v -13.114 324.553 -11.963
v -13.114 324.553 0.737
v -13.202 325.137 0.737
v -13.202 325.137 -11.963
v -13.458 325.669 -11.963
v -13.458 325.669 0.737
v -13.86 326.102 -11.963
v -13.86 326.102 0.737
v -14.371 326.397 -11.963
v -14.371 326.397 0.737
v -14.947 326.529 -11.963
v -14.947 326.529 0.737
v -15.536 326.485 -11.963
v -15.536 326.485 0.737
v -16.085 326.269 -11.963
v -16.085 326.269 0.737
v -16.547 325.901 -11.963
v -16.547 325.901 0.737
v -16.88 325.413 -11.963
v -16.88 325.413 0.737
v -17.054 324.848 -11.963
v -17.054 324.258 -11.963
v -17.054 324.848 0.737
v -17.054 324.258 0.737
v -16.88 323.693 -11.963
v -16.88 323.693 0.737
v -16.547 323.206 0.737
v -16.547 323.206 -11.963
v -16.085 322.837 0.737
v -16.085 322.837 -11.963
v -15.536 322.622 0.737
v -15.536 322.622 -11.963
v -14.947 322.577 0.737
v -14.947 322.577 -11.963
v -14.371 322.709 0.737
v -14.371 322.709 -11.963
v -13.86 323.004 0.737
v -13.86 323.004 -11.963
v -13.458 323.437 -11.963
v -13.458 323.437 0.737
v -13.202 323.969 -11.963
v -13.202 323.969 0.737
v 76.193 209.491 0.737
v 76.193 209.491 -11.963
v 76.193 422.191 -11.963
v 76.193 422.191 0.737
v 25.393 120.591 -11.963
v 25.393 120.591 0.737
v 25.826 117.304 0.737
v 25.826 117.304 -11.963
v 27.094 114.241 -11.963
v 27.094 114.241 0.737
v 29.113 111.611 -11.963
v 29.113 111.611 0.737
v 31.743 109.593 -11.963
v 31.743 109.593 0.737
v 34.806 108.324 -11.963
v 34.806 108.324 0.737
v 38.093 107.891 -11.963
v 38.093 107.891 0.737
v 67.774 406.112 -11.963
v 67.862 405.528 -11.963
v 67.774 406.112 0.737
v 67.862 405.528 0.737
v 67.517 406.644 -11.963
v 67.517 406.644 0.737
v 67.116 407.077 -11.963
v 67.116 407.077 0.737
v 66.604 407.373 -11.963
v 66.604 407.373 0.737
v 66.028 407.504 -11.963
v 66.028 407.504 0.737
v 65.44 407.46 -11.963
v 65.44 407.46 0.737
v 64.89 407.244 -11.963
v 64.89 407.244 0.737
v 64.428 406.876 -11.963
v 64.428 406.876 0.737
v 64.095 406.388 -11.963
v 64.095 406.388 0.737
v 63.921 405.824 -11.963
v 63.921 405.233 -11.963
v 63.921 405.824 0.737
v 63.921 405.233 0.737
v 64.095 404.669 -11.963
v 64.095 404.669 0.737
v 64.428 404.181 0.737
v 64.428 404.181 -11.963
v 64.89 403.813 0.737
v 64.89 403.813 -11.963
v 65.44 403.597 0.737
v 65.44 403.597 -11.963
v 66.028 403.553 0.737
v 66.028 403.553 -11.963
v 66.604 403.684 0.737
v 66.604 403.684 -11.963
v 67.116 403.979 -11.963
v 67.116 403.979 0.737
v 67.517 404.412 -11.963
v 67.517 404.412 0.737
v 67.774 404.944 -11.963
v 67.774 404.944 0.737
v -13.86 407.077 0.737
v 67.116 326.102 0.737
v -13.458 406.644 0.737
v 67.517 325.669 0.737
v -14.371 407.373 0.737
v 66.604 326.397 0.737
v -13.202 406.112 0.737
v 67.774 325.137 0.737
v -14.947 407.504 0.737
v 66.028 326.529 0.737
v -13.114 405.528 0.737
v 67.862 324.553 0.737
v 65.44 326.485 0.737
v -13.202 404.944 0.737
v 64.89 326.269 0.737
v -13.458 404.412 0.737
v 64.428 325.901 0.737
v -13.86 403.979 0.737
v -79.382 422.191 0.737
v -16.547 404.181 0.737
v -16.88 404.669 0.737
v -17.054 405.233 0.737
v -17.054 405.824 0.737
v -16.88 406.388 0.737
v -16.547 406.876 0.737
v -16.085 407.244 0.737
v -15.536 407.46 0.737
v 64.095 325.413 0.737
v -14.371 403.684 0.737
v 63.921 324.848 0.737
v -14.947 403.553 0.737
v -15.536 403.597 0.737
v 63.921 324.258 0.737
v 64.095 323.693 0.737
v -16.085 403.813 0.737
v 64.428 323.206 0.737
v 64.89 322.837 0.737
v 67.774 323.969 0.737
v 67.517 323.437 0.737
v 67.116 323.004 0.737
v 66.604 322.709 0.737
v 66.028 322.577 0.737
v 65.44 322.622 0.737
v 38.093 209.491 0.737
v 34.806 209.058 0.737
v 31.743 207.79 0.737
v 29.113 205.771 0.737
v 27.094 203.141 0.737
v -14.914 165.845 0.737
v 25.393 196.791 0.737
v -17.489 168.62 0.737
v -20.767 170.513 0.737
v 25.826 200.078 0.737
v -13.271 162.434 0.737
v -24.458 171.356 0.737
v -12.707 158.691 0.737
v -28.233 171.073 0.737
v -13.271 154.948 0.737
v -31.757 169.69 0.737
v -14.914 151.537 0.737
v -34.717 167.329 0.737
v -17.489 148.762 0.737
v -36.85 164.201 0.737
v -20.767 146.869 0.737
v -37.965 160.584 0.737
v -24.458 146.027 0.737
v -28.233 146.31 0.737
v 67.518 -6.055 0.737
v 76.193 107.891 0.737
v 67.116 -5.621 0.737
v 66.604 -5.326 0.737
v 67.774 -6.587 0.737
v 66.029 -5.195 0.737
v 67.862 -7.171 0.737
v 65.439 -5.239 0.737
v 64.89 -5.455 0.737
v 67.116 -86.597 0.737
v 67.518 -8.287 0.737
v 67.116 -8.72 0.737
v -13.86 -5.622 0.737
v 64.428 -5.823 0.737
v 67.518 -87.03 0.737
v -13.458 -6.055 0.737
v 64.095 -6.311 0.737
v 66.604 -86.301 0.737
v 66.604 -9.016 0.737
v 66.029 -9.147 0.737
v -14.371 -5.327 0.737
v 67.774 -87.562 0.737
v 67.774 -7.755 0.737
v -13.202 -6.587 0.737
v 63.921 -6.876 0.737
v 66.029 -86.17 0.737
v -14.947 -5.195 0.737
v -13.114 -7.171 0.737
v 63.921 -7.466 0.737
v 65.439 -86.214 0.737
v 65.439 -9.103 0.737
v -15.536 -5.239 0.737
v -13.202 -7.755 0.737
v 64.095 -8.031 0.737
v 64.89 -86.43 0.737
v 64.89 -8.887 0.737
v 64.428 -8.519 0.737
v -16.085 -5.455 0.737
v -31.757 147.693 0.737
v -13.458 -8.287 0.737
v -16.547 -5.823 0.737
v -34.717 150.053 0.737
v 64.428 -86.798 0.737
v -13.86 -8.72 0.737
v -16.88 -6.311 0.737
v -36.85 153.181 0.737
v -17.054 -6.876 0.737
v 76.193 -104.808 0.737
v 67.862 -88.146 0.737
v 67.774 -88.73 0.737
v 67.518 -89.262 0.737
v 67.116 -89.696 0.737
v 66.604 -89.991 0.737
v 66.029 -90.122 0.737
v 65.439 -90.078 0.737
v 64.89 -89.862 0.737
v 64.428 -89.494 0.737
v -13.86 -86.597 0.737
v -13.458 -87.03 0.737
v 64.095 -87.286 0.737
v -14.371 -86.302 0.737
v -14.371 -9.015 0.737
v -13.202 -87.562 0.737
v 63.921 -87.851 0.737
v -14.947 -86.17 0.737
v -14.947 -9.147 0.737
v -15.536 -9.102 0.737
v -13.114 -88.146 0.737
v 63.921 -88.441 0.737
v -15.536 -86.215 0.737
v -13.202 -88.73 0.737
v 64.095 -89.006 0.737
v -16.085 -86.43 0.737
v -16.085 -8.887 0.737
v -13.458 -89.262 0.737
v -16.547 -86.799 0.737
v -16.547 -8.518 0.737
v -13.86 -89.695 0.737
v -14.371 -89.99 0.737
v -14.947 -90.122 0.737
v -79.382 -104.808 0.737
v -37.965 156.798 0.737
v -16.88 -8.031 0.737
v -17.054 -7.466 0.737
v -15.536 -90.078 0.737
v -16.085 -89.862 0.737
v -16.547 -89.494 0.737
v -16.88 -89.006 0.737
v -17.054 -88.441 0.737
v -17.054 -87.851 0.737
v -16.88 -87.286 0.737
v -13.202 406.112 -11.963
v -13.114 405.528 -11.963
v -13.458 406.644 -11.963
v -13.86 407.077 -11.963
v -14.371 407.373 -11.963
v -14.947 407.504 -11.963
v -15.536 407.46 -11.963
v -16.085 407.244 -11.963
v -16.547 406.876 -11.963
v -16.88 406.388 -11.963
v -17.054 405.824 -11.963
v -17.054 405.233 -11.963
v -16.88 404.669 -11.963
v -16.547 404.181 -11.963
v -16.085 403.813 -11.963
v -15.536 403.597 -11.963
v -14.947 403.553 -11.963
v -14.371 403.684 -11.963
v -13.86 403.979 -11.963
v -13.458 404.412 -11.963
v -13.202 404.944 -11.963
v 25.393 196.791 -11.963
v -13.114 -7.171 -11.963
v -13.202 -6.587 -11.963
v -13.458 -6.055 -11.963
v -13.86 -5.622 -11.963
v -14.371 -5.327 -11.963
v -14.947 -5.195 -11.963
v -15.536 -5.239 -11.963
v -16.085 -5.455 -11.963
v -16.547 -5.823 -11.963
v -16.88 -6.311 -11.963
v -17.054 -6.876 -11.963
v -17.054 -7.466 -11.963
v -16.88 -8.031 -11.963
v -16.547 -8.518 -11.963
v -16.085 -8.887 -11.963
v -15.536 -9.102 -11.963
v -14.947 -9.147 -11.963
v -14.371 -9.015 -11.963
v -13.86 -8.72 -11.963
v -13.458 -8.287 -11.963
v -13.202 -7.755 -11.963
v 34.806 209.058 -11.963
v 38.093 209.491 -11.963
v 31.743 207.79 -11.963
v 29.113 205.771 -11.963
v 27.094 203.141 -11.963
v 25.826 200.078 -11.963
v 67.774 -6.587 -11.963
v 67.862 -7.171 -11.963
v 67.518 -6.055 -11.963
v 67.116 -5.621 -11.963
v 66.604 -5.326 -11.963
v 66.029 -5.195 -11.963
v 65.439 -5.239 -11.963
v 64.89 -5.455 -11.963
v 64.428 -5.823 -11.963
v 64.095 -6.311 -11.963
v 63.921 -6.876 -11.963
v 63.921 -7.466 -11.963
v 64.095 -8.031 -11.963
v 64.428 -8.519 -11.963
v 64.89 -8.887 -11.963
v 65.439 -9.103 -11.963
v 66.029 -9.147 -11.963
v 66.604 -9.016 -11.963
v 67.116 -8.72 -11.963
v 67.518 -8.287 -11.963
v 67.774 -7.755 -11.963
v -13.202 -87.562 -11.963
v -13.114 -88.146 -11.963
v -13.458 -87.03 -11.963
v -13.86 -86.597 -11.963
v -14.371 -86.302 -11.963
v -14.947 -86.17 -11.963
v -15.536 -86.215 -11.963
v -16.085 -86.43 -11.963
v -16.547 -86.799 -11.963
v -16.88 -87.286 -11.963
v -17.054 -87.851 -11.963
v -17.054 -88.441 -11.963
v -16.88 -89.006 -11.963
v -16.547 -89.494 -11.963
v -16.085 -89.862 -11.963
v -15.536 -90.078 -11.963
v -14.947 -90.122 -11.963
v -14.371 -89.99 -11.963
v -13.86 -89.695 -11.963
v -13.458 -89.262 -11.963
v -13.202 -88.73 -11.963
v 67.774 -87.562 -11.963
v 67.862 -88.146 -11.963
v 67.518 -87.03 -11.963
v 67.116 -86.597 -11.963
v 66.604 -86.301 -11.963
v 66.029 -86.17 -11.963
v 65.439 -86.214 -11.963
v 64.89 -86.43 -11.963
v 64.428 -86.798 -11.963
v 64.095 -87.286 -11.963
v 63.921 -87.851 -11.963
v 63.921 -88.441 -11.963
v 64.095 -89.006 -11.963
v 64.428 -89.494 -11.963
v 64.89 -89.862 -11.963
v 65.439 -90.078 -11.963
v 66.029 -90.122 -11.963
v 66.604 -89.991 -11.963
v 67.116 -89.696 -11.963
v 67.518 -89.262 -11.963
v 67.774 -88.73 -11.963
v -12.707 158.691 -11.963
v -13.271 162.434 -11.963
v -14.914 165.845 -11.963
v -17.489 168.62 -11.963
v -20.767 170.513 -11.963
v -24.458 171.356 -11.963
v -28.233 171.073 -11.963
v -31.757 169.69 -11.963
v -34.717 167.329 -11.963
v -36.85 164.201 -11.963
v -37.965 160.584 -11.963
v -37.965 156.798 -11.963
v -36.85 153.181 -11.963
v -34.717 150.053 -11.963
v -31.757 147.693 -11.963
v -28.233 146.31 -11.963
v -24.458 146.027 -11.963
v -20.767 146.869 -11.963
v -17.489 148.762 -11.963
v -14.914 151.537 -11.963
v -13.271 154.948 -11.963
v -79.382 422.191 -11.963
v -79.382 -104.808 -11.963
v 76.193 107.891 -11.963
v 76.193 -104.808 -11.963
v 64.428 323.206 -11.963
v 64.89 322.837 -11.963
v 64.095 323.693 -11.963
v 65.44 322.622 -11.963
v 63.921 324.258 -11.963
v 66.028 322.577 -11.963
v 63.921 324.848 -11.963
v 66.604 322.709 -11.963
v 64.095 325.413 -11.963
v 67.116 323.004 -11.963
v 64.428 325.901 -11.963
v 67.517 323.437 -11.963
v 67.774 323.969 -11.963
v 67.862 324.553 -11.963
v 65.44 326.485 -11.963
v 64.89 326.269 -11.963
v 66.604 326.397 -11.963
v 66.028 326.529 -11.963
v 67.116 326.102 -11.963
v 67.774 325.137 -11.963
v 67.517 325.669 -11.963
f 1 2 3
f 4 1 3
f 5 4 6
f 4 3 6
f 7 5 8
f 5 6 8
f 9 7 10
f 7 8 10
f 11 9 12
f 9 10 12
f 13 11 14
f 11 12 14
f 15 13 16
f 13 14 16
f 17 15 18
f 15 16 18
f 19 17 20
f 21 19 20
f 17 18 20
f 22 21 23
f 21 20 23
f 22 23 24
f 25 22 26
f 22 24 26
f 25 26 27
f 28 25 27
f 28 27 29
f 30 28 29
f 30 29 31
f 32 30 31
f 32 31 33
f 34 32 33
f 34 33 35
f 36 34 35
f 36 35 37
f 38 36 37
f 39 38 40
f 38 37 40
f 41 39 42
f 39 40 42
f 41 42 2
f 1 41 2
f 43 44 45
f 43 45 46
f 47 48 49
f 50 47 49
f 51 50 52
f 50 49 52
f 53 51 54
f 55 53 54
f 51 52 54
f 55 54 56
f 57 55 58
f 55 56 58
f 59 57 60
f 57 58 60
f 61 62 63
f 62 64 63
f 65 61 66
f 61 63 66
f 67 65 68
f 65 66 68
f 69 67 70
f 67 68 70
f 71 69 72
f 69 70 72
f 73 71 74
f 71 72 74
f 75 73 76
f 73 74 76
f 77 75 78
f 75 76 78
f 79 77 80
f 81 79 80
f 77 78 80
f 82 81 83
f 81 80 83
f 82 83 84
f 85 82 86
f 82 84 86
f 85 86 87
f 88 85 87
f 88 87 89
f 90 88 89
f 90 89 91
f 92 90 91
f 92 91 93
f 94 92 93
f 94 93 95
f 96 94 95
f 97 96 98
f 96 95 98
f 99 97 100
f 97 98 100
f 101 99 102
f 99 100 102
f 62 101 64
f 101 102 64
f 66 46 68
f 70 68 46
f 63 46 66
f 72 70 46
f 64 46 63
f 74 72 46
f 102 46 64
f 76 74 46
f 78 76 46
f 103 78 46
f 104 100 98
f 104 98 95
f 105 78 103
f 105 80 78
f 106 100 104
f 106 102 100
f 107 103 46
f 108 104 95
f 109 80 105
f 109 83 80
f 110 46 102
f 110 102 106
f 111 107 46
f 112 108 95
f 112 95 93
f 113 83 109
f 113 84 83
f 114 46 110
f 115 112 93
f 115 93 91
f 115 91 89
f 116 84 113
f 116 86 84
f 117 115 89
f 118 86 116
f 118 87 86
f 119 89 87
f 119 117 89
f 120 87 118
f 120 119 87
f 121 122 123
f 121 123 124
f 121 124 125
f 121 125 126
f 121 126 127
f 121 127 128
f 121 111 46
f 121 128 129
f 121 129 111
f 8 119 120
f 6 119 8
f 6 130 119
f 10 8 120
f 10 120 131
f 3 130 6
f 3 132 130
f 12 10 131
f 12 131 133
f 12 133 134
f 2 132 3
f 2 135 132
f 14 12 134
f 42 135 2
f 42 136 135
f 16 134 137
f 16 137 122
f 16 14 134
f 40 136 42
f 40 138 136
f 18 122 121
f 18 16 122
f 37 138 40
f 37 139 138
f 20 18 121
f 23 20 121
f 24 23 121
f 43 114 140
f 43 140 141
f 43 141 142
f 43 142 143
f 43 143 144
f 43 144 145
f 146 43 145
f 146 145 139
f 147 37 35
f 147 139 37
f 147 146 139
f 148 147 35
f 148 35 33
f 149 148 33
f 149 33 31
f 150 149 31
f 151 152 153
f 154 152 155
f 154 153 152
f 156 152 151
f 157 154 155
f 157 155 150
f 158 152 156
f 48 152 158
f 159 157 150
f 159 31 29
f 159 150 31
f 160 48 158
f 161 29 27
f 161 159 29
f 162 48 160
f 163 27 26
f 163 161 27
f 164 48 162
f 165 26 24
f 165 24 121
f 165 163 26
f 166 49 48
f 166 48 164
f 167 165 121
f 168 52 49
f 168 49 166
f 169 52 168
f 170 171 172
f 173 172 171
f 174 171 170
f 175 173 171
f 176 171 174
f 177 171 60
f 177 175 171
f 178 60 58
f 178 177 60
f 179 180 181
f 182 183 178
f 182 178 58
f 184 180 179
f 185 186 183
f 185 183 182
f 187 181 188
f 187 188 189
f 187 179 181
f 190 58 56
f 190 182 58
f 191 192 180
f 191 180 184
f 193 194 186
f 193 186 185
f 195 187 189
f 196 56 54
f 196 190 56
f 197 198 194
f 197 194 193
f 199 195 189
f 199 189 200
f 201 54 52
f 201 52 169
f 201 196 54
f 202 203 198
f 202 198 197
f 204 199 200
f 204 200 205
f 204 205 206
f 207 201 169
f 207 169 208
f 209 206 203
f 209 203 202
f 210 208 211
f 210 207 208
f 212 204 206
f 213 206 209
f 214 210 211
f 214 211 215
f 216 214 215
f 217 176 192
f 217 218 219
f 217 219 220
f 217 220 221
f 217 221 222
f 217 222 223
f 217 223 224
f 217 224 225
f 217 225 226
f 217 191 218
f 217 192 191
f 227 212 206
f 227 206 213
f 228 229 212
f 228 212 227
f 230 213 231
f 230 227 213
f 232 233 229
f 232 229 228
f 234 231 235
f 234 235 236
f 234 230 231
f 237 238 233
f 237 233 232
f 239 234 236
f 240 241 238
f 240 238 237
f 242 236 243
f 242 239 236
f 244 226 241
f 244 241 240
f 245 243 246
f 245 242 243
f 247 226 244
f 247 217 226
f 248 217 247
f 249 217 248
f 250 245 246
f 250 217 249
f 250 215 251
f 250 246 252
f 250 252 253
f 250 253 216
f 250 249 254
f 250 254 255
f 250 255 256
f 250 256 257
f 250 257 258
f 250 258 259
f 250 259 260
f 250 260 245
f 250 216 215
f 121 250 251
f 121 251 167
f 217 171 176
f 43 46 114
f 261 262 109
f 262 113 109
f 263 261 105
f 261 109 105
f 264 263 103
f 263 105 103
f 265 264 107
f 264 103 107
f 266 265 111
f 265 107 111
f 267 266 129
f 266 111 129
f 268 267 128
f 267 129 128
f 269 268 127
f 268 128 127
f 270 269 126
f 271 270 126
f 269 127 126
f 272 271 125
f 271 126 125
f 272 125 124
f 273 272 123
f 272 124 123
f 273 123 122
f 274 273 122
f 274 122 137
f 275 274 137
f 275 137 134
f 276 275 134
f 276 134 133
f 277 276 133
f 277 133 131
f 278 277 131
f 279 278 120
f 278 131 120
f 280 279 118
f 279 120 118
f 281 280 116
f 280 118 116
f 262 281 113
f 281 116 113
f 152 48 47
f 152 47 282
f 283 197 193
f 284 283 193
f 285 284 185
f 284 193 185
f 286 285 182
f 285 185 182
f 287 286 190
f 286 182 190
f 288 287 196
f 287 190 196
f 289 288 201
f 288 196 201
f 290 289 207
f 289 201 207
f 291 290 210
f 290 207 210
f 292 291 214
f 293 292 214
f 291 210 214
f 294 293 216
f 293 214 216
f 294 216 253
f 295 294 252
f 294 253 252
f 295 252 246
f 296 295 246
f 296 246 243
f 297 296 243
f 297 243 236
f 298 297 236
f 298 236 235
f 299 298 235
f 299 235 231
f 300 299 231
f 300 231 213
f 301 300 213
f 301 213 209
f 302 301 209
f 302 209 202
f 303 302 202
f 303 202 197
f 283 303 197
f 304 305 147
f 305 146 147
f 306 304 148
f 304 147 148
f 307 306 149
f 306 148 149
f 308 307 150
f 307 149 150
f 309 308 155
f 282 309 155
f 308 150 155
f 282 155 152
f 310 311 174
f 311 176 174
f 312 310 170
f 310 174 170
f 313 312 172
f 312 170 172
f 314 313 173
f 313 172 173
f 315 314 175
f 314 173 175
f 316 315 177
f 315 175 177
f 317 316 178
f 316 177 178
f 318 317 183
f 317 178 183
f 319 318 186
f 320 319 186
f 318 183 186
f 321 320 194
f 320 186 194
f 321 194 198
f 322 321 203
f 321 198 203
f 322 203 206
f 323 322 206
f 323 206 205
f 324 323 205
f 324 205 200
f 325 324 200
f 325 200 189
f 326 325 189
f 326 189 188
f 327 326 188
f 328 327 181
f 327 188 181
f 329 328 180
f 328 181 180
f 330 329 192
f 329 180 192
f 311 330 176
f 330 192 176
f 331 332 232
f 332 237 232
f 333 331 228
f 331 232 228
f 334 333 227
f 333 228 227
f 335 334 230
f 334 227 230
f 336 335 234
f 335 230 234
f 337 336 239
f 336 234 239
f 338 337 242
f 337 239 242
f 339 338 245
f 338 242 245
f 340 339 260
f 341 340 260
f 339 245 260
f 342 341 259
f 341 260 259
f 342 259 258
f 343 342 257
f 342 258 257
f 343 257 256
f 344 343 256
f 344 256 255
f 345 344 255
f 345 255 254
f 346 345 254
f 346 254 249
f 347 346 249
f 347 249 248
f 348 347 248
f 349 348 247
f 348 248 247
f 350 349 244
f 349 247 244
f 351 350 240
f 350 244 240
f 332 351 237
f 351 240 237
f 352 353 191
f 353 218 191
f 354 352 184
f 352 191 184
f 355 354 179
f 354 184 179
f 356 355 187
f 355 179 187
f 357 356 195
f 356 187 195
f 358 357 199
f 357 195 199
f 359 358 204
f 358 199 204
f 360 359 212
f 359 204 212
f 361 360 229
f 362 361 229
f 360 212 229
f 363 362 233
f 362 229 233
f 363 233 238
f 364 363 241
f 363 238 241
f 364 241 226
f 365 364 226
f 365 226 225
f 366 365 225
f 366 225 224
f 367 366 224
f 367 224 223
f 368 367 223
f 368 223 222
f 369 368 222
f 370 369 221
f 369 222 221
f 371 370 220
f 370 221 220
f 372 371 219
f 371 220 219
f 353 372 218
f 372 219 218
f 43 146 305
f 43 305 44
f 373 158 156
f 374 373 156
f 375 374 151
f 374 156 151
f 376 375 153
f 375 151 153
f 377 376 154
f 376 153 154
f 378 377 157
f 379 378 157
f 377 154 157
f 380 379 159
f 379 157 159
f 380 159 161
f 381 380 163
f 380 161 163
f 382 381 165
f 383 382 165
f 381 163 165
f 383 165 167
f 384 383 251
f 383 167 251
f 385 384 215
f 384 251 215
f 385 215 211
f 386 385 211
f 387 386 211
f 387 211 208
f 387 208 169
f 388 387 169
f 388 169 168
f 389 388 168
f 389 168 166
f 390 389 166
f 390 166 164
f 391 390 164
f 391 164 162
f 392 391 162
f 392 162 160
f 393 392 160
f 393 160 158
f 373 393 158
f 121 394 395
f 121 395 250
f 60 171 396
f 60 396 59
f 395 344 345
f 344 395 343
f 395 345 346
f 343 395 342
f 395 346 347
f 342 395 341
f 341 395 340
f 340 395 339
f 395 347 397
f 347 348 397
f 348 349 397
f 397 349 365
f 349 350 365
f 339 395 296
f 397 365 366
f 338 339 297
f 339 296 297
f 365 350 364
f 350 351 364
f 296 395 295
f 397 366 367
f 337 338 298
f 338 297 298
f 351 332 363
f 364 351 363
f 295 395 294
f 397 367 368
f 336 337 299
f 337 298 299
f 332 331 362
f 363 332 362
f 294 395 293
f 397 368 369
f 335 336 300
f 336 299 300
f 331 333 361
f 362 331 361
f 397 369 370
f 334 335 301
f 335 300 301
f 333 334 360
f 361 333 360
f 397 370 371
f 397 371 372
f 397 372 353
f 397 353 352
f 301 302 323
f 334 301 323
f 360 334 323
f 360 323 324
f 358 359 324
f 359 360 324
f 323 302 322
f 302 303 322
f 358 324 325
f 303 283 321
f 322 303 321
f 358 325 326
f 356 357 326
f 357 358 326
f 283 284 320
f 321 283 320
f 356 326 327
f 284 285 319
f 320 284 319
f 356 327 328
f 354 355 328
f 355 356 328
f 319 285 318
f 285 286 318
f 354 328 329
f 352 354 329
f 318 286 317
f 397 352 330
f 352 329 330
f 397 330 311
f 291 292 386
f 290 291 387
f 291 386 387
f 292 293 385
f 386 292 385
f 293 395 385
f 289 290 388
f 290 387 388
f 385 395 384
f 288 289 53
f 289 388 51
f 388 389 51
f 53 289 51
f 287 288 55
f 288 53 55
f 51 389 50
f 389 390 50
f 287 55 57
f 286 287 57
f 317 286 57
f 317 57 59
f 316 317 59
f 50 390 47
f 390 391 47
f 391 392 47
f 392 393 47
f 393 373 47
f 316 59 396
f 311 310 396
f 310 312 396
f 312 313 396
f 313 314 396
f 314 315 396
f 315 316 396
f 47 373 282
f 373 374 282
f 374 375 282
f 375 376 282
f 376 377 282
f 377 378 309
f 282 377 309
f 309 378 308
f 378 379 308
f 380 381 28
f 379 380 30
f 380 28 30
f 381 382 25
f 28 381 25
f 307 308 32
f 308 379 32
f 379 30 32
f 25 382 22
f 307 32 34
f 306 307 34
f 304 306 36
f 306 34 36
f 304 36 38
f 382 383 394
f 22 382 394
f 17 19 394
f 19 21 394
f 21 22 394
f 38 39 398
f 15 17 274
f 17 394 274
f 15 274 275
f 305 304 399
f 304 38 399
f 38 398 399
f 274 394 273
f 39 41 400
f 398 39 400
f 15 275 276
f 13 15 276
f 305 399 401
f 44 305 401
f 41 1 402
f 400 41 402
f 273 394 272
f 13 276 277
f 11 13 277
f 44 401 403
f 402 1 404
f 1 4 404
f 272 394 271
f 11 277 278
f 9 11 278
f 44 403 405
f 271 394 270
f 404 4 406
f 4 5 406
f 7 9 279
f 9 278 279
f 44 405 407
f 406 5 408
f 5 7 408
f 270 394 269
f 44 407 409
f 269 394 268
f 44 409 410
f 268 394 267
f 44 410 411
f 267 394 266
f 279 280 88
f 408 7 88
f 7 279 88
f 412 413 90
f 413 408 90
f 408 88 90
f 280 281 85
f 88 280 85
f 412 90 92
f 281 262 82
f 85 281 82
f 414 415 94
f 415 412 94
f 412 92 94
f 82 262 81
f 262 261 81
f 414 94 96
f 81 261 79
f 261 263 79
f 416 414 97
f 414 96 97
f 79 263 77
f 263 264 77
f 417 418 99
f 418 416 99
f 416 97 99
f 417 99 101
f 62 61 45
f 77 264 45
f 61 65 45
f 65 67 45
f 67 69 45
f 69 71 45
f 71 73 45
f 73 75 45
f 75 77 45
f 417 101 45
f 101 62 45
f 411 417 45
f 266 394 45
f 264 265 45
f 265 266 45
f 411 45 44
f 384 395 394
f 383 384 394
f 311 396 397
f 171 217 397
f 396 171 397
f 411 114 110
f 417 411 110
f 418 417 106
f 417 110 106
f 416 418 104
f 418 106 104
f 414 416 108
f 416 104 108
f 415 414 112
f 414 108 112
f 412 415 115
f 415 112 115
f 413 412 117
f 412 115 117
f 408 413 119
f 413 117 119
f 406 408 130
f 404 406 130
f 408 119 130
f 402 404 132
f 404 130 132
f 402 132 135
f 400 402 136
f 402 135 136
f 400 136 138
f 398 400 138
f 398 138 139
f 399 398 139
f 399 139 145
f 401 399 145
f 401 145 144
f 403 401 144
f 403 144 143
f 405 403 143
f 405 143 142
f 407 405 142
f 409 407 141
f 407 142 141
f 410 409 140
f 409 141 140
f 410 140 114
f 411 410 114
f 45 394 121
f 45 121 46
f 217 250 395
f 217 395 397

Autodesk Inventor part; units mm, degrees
ref_plane "YZ Plane" through (0, 0, 0) normal (1, 0, 0) x (0, 1, 0)
ref_plane "XZ Plane" through (0, 0, 0) normal (0, 1, 0) x (-1, 0, 0)
ref_plane "XY Plane" through (0, 0, 0) normal (0, 0, 1) x (1, 0, 0)
sketch "Sketch1" plane through (0, 0, 0) normal (0, 0, 1) x (1, 0, 0)
  line L0 (-25.4072, 25.3665) -> (76.1928, 25.3665)
  line L1 (76.1928, 25.3665) -> (76.1928, -76.2335)
  line L2 (76.1928, -76.2335) -> (-25.4072, -76.2335)
  line L3 (-25.4072, -76.2335) -> (-25.4072, 25.3665)
  point P0 (0, 0)
  dimension "d0" = 101.6
  dimension "d1" = 101.6
extrude "Extrusion1" add sketch "Sketch1" along normal blind 0.7366
sketch "Sketch2" plane through (0, 0, 0.7366) normal (0, 0, 1) x (1, 0, 0)
  line L0 (-25.4072, 25.3665) -> (76.1928, -76.2335)
  line L1 (76.1928, 25.3665) -> (-25.4072, -76.2335)
  circle A0 centre (25.3928, -25.4335) radius 27.432
  point P0 (0, 0)
  dimension "d4" = 54.864
extrude "Extrusion2" cut sketch "Sketch2" against normal blind 0.7366
sketch "Sketch3" plane through (0, 0, 0.7366) normal (0, 0, 1) x (1, 0, 0)
  line L0 (-25.4072, -76.2335) -> (-25.4072, 25.3665) projected
  line L1 (-25.4072, 25.3665) -> (-25.4072, -25.4335)
  line L2 (-25.4072, -25.4335) -> (-25.4072, 19.4102)
  line L3 (-25.4072, 25.3665) -> (76.1928, -76.2335)
  line L4 (76.1928, 25.3665) -> (-25.4072, -76.2335)
  circle A0 centre (-19.4509, 19.4102) radius 1.9812
  point P0 (0, 0)
  dimension "d7" = 44.8437
  dimension "d8" = 3.9624
extrude "Extrusion3" cut sketch "Sketch3" against normal blind 0.7366 contours A0 L3 | L3 A0
sketch "Sketch4" plane through (0, 0, 0.7366) normal (0, 0, 1) x (1, 0, 0)
  line L0 (-25.4072, -76.2335) -> (76.1928, 25.3665)
  line L1 (-25.4072, 25.3665) -> (76.1928, -76.2335)
  circle A0 centre (70.2365, 19.4102) radius 1.9819
  circle A1 centre (70.2365, -70.2772) radius 1.983
  circle A2 centre (-19.4509, -70.2772) radius 1.9812
  point P0 (0, 0)
extrude "Extrusion4" cut sketch "Sketch4" against normal blind 0.7366
sketch "Sketch5" plane through (0, 0, 0.7366) normal (0, 0, 1) x (1, 0, 0)
  circle A0 centre (25.3928, -25.4335) radius 27.432 projected
  circle A1 centre (25.3928, -25.4335) radius 29.972
  circle A2 centre (25.3928, -25.4335) radius 32.512
  point P0 (0, 0)
  dimension "d13" = 59.944
  dimension "d14" = 65.024
extrude "Extrusion5" add sketch "Sketch5" along normal blind 6.6548 contours A2
fillet "Fillet1" radius 3.175 4 edges at (-25.4072, 25.3665, 0.3683) (76.1928, 25.3665, 0.3683) (76.1928, -76.2335, 0.3683) (-25.4072, -76.2335, 0.3683)
sketch "Sketch6" plane through (25.3928, -25.4335, 0.7366) normal (0, 0, 1) x (1, 0, 0)
  circle A0 centre (0, 0) radius 29.972 projected
  circle A1 centre (0, 0) radius 27.432 projected
  point P0 (-25.3928, 25.4335)
extrude "Extrusion6" add sketch "Sketch6" along normal blind 9.1948
sketch "Sketch7" plane through (25.3928, -25.4335, 7.3914) normal (0, 0, 1) x (1, 0, 0)
  circle A0 centre (0, 0) radius 29.972 projected
  circle A1 centre (0, 0) radius 32.512 projected
  point P0 (-25.3928, 25.4335)
extrude "Extrusion7" cut sketch "Sketch7" against normal blind 6.6548
sketch "Sketch8" plane through (25.3928, -25.4335, 9.9314) normal (0, 0, 1) x (1, 0, 0)
  circle A0 centre (0, 0) radius 27.432 projected
  circle A1 centre (0, 0) radius 29.972 projected
  point P0 (-25.3928, 25.4335)
extrude "Extrusion8" cut sketch "Sketch8" against normal blind 2.54
sketch "Sketch9" plane through (0, 0, 0.7366) normal (0, 0, 1) x (1, 0, 0)
  circle A0 centre (-19.4509, 19.4102) radius 1.9812 projected
  circle A1 centre (70.2365, -70.2772) radius 1.983 projected
  circle A2 centre (-19.4509, -70.2772) radius 1.9812 projected
  circle A3 centre (70.2365, 19.4102) radius 1.9819 projected
  point P0 (0, 0)
extrude "Extrusion9" add sketch "Sketch9" against normal blind 0.7366
sketch "Sketch10" plane through (0, 0, 0.7366) normal (0, 0, 1) x (1, 0, 0)
  line L0 (-25.4072, 25.3665) -> (76.1928, 25.3665)
  line L1 (76.1928, 25.3665) -> (76.1928, -76.2335)
  line L2 (76.1928, -76.2335) -> (-25.4072, -76.2335)
  line L3 (-25.4072, -76.2335) -> (-25.4072, 25.3665)
  line L4 (-25.4072, 25.3665) -> (76.1928, -76.2335)
  line L5 (-25.4072, -76.2335) -> (76.1928, 25.3665)
  line L6 (-25.4072, 25.3665) -> (-25.4072, -25.4335)
  line L7 (-25.4072, -25.4335) -> (-25.4072, 15.0541)
  circle A0 centre (-15.0948, 15.0541) radius 1.9812
  circle A1 centre (65.8804, 15.0541) radius 1.9818
  circle A2 centre (65.8804, -65.9211) radius 1.9832
  circle A3 centre (-15.0948, -65.9211) radius 1.9812
  point P0 (0, 0)
  dimension "d26" = 40.4876
  dimension "d27" = 3.9624
extrude "Extrusion10" cut sketch "Sketch10" against normal blind 0.7366 contours A0 L4 | L4 A0 | A1 L5 | L5 A1 | A2 L4 | L4 A2 | A3 L5 | L5 A3
sketch "Sketch11" plane through (0, 0, 0.7366) normal (0, 0, 1) x (1, 0, 0)
  circle A0 centre (-15.0948, 15.0541) radius 1.9812 projected
  circle A1 centre (-15.0948, -65.9211) radius 1.9812 projected
  circle A2 centre (65.8804, 15.0541) radius 1.9818 projected
  circle A3 centre (65.8804, -65.9211) radius 1.9832 projected
  line L0 (-25.4072, 25.3665) -> (76.1928, 25.3665)
  line L1 (76.1928, 25.3665) -> (76.1928, -76.2335)
  line L2 (76.1928, -76.2335) -> (-25.4072, -76.2335)
  line L3 (-25.4072, -76.2335) -> (-25.4072, 25.3665)
  point P0 (0, 0)
extrude "Extrusion11" add sketch "Sketch11" along normal blind 12.7
sketch "Sketch12" plane through (0, 0, 13.4366) normal (0, 0, 1) x (1, 0, 0)
  circle A0 centre (65.8804, -65.9211) radius 1.9832 projected
  circle A1 centre (65.8804, 15.0541) radius 1.9818 projected
  circle A2 centre (-15.0948, 15.0541) radius 1.9812 projected
  circle A3 centre (-15.0948, -65.9211) radius 1.9812 projected
  line L0 (76.1928, 25.3665) -> (76.1928, -76.2335) projected
  line L1 (-25.4072, 25.3665) -> (76.1928, 25.3665) projected
  line L2 (-25.4072, -76.2335) -> (-25.4072, 25.3665) projected
  line L3 (76.1928, -76.2335) -> (-25.4072, -76.2335) projected
  point P0 (0, 0)
extrude "Extrusion12" add sketch "Sketch12" against normal blind 19.05
sketch "Sketch13" plane through (0, 0, 13.4366) normal (0, 0, 1) x (1, 0, 0)
  circle A0 centre (65.8804, -65.9211) radius 1.9832 projected
  circle A1 centre (65.8804, 15.0541) radius 1.9818 projected
  circle A2 centre (-15.0948, 15.0541) radius 1.9812 projected
  circle A3 centre (-15.0948, -65.9211) radius 1.9812 projected
  line L0 (76.1928, 25.3665) -> (76.1928, -76.2335) projected
  line L1 (-25.4072, 25.3665) -> (76.1928, 25.3665) projected
  line L2 (-25.4072, -76.2335) -> (-25.4072, 25.3665) projected
  line L3 (76.1928, -76.2335) -> (-25.4072, -76.2335) projected
  point P0 (0, 0)
extrude "Extrusion13" cut sketch "Sketch13" against normal blind 12.7
sketch "Sketch14" plane through (-25.4072, 25.3665, -5.6134) normal (0, 1, 0) x (1, 0, 0)
  line L0 (0, -6.35) -> (101.6, -6.35) projected
  line L1 (101.6, -6.35) -> (101.6, 0) projected
  line L2 (101.6, 0) -> (0, 0) projected
  line L3 (0, 0) -> (0, -6.35) projected
  point P0 (25.4072, -5.6134)
sketch "Sketch15" plane through (-25.4072, -76.2335, -5.6134) normal (-1, 0, 0) x (0, 0, 1)
  line L0 (6.35, 0) -> (6.35, 101.6) projected
  line L1 (0, 101.6) -> (6.35, 101.6) projected
  line L2 (0, 101.6) -> (0, 0) projected
  line L3 (6.35, 0) -> (0, 0) projected
  point P0 (5.6134, 76.2335)
sketch "Sketch16" plane through (-25.4072, -76.2335, -5.6134) normal (0, -1, 0) x (1, 0, 0)
  line L0 (101.6, 6.35) -> (0, 6.35) projected
  line L1 (0, 6.35) -> (0, 0) projected
  line L2 (0, 0) -> (101.6, 0) projected
  line L3 (101.6, 6.35) -> (101.6, 0) projected
  point P0 (25.4072, 5.6134)
sketch "Sketch17" plane through (76.1928, -76.2335, -5.6134) normal (1, 0, 0) x (0, 0, -1)
  line L0 (-6.35, 101.6) -> (-6.35, 0) projected
  line L1 (-6.35, 0) -> (0, 0) projected
  line L2 (0, 0) -> (0, 101.6) projected
  line L3 (-6.35, 101.6) -> (0, 101.6) projected
  point P0 (-5.6134, 76.2335)
extrude "Extrusion14" add sketch "Sketch14" along normal blind 53.975
extrude "Extrusion15" add sketch "Sketch17" along normal blind 47.625
extrude "Extrusion16" add sketch "Sketch16" along normal blind 47.625
extrude "Extrusion17" add sketch "Sketch15" along normal blind 53.975
sketch "Sketch18" plane through (-25.4072, 25.3665, 0.7366) normal (0, 1, 0) x (1, 0, 0)
  line L0 (-53.975, 6.35) -> (-53.975, 0) projected
  line L1 (0, 0) -> (-53.975, 0) projected
  line L2 (0, 6.35) -> (0, 0) projected
  line L3 (0, 6.35) -> (-53.975, 6.35) projected
  point P0 (25.4072, 0.7366)
extrude "Extrusion18" add sketch "Sketch18" along normal blind 53.975
sketch "Sketch19" plane through (76.1928, 25.3665, 0.7366) normal (0, 1, 0) x (1, 0, 0)
  line L0 (47.625, 0) -> (47.625, 6.35) projected
  line L1 (0, 6.35) -> (47.625, 6.35) projected
  line L2 (0, 0) -> (0, 6.35) projected
  line L3 (0, 0) -> (47.625, 0) projected
  point P0 (-76.1928, 0.7366)
extrude "Extrusion19" add sketch "Sketch19" along normal blind 53.975
sketch "Sketch20" plane through (-25.4072, -123.8585, -5.6134) normal (-1, 0, 0) x (0, 0, 1)
  line L0 (6.35, 47.625) -> (0, 47.625) projected
  line L1 (0, 47.625) -> (0, 0) projected
  line L2 (0, 0) -> (6.35, 0) projected
  line L3 (6.35, 0) -> (6.35, 47.625) projected
  point P0 (5.6134, 123.8585)
extrude "Extrusion20" add sketch "Sketch20" along normal blind 53.975
sketch "Sketch21" plane through (123.8178, -76.2335, -5.6134) normal (0, -1, 0) x (1, 0, 0)
  line L0 (-47.625, 6.35) -> (-47.625, 0) projected
  line L1 (-47.625, 0) -> (0, 0) projected
  line L2 (0, 0) -> (0, 6.35) projected
  line L3 (0, 6.35) -> (-47.625, 6.35) projected
  point P0 (-123.8178, 5.6134)
extrude "Extrusion21" add sketch "Sketch21" along normal blind 47.625
sketch "Sketch22" plane through (-25.4072, 79.3415, -5.6134) normal (0, 1, 0) x (1, 0, 0)
  line L0 (149.225, -6.35) -> (-53.975, -6.35) projected
  line L1 (149.225, 0) -> (149.225, -6.35) projected
  line L2 (-53.975, 0) -> (149.225, 0) projected
  line L3 (-53.975, -6.35) -> (-53.975, 0) projected
  point P0 (25.4072, -5.6134)
extrude "Extrusion22" cut sketch "Sketch22" against normal blind 53.975
sketch "Sketch23" plane through (-79.3822, -76.2335, -5.6134) normal (-1, 0, 0) x (0, 0, 1)
  line L0 (6.35, 101.6) -> (0, 101.6) projected
  line L1 (0, -47.625) -> (0, 101.6) projected
  line L2 (6.35, -47.625) -> (0, -47.625) projected
  line L3 (6.35, 101.6) -> (6.35, -47.625) projected
  point P0 (5.6134, 76.2335)
extrude "Extrusion23" cut sketch "Sketch23" against normal blind 53.975
sketch "Sketch24" plane through (-25.4072, -123.8585, -5.6134) normal (0, -1, 0) x (1, 0, 0)
  line L0 (0, 6.35) -> (0, 0) projected
  line L1 (149.225, 0) -> (0, 0) projected
  line L2 (149.225, 6.35) -> (149.225, 0) projected
  line L3 (0, 6.35) -> (149.225, 6.35) projected
  point P0 (25.4072, 5.6134)
extrude "Extrusion24" cut sketch "Sketch24" against normal blind 47.625
sketch "Sketch25" plane through (123.8178, -76.2335, -5.6134) normal (1, 0, 0) x (0, 0, -1)
  line L0 (-6.35, 0) -> (0, 0) projected
  line L1 (0, 101.6) -> (0, 0) projected
  line L2 (0, 101.6) -> (-6.35, 101.6) projected
  line L3 (-6.35, 0) -> (-6.35, 101.6) projected
  point P0 (-5.6134, 76.2335)
extrude "Extrusion25" cut sketch "Sketch25" against normal blind 47.625
sketch "Sketch26" plane through (-25.4072, 25.3665, -5.6134) normal (0, 1, 0) x (1, 0, 0)
  line L0 (101.6, -6.35) -> (101.6, 0) projected
  line L1 (0, 0) -> (101.6, 0) projected
  line L2 (0, 0) -> (0, -6.35) projected
  line L3 (101.6, -6.35) -> (0, -6.35) projected
  point P0 (25.4072, -5.6134)
extrude "Extrusion26" add sketch "Sketch26" along normal blind 53.975
sketch "Sketch27" plane through (-25.4072, -76.2335, -5.6134) normal (-1, 0, 0) x (0, 0, 1)
  line L0 (0, 0) -> (6.35, 0) projected
  line L1 (6.35, 0) -> (6.35, 155.575) projected
  line L2 (6.35, 155.575) -> (0, 155.575) projected
  line L3 (0, 0) -> (0, 155.575) projected
  point P0 (5.6134, 76.2335)
extrude "Extrusion27" add sketch "Sketch27" along normal blind 53.975
sketch "Sketch28" plane through (-25.4072, -76.2335, -5.6134) normal (0, -1, 0) x (1, 0, 0)
  line L0 (101.6, 0) -> (101.6, 6.35) projected
  line L1 (101.6, 6.35) -> (-53.975, 6.35) projected
  line L2 (-53.975, 6.35) -> (-53.975, 0) projected
  line L3 (101.6, 0) -> (-53.975, 0) projected
  point P0 (25.4072, 5.6134)
extrude "Extrusion28" add sketch "Sketch28" along normal blind 22.225
sketch "Sketch29" plane through (-25.4072, 79.3415, -5.6134) normal (0, 1, 0) x (1, 0, 0)
  line L0 (101.6, -6.35) -> (-53.975, -6.35) projected
  line L1 (101.6, 0) -> (101.6, -6.35) projected
  line L2 (-53.975, 0) -> (101.6, 0) projected
  line L3 (-53.975, 0) -> (-53.975, -6.35) projected
  point P0 (25.4072, -5.6134)
extrude "Extrusion29" add sketch "Sketch29" along normal blind 158.6992
sketch "Sketch30" plane through (-25.4072, 238.0407, -5.6134) normal (0, 1, 0) x (1, 0, 0)
  line L0 (-53.975, -6.35) -> (-53.975, 0) projected
  line L1 (101.6, -6.35) -> (-53.975, -6.35) projected
  line L2 (101.6, 0) -> (101.6, -6.35) projected
  line L3 (-53.975, 0) -> (101.6, 0) projected
  point P0 (25.4072, -5.6134)
extrude "Extrusion30" add sketch "Sketch30" along normal blind 177.8
sketch "Sketch31" plane through (0, 0, 0.7366) normal (0, 0, 1) x (1, 0, 0)
  line L0 (76.1928, 415.8407) -> (76.1928, -98.4585) projected
  line L1 (76.1928, 415.8407) -> (-79.3822, 415.8407) projected
  line L2 (65.8804, 415.8407) -> (65.8804, 383.3033)
  line L3 (65.8804, 383.3033) -> (-17.076, 383.3033)
  line L4 (-17.076, 383.3033) -> (-13.1136, 383.3033)
  line L5 (-13.1136, 383.3033) -> (-15.0948, 383.3033)
  circle A0 centre (-15.0948, 383.3033) radius 1.9812
  circle A1 centre (65.8804, 383.3033) radius 1.9812
  line L6 (65.8804, 383.3033) -> (65.8804, 302.3281)
  circle A2 centre (65.8804, 302.3281) radius 1.9812
  line L7 (-15.0948, 383.3033) -> (-15.0948, 302.3281)
  circle A3 centre (-15.0948, 302.3281) radius 1.9812
  point P0 (0, 0)
  dimension "d70" = 32.5374
  dimension "d71" = 80.9752
extrude "Extrusion31" cut sketch "Sketch31" against normal blind 177.8
sketch "Sketch32" plane through (0, 0, -5.6134) normal (0, 0, -1) x (-1, 0, 0)
  circle A0 centre (15.0948, 383.3033) radius 1.9812 projected
  circle A1 centre (15.0948, 302.3281) radius 1.9812 projected
  circle A2 centre (-65.8804, 302.3281) radius 1.9812 projected
  circle A3 centre (-65.8804, 383.3033) radius 1.9812 projected
  circle A4 centre (15.0948, -65.9211) radius 1.9812 projected
  circle A5 centre (15.0948, 15.0541) radius 1.9812 projected
  circle A6 centre (-65.8804, 15.0541) radius 1.9818 projected
  circle A7 centre (-65.8804, -65.9211) radius 1.9832 projected
  line L0 (-76.1928, 415.8407) -> (-76.1928, -98.4585) projected
  line L1 (-76.1928, -98.4585) -> (79.3822, -98.4585) projected
  line L2 (79.3822, -98.4585) -> (79.3822, 415.8407) projected
  line L3 (79.3822, 415.8407) -> (-76.1928, 415.8407) projected
  point P0 (0, 0)
extrude "Extrusion32" add sketch "Sketch32" along normal blind 6.35
sketch "Sketch33" plane through (0, 0, 0.7366) normal (0, 0, 1) x (1, 0, 0)
  line L0 (76.1928, 415.8407) -> (76.1928, -98.4585) projected
  line L1 (76.1928, 158.6911) -> (76.1928, 107.8911)
  line L2 (76.1928, 107.8911) -> (25.3928, 107.8911)
  line L3 (25.3928, 107.8911) -> (25.3928, 209.4911)
  line L4 (25.3928, 209.4911) -> (76.1928, 209.4911)
  line L5 (76.1928, 209.4911) -> (76.1928, 107.8911)
  point P0 (0, 0)
  dimension "d76" = 50.8
  dimension "d77" = 50.8
  dimension "d78" = 101.6
extrude "Extrusion33" cut sketch "Sketch33" against normal blind 25.4
sketch "Sketch34" plane through (0, 0, 0.7366) normal (0, 0, 1) x (1, 0, 0)
  line L0 (25.3928, 107.8911) -> (25.3928, 209.4911) projected
  line L1 (76.1928, 107.8911) -> (76.1928, -98.4585) projected
  line L2 (25.3928, 158.6911) -> (-25.4072, 158.6911)
  circle A0 centre (-25.4072, 158.6911) radius 12.7
  point P0 (0, 0)
  dimension "d81" = 50.8
  dimension "d82" = 25.4
extrude "Extrusion34" cut sketch "Sketch34" against normal blind 25.4
fillet "Fillet2" radius 12.7 2 edges at (25.3928, 209.4911, -5.6134) (25.3928, 107.8911, -5.6134)
sketch "Sketch35" plane through (0, 0, 0.7366) normal (0, 0, 1) x (1, 0, 0)
  line L0 (-79.3822, 415.8407) -> (76.1928, 415.8407)
  line L1 (76.1928, 415.8407) -> (76.1928, 422.1907)
  line L2 (76.1928, 422.1907) -> (-79.3822, 422.1907)
  line L3 (-79.3822, 422.1907) -> (-79.3822, 415.8407)
  line L4 (-79.3822, -98.4585) -> (76.1928, -98.4585)
  line L5 (76.1928, -98.4585) -> (76.1928, -104.8085)
  line L6 (76.1928, -104.8085) -> (-79.3822, -104.8085)
  line L7 (-79.3822, -104.8085) -> (-79.3822, -98.4585)
  point P0 (0, 0)
  dimension "d86" = 6.35
  dimension "d87" = 6.35
extrude "Extrusion35" add sketch "Sketch35" against normal blind 6.35
sketch "Sketch36" plane through (-25.4072, 415.8407, -5.6134) normal (0, 1, 0) x (1, 0, 0)
  line L0 (-53.975, 0) -> (101.6, 0) projected
  line L1 (101.6, 6.35) -> (101.6, 0) projected
  line L2 (101.6, 6.35) -> (-53.975, 6.35) projected
  line L3 (-53.975, 0) -> (-53.975, 6.35) projected
  point P0 (25.4072, -5.6134)
extrude "Extrusion36" add sketch "Sketch36" along normal blind 6.35
sketch "Sketch37" plane through (-25.4072, -98.4585, -5.6134) normal (0, -1, 0) x (1, 0, 0)
  line L0 (101.6, 0) -> (-53.975, 0) projected
  line L1 (-53.975, -6.35) -> (-53.975, 0) projected
  line L2 (-53.975, -6.35) -> (101.6, -6.35) projected
  line L3 (101.6, 0) -> (101.6, -6.35) projected
  point P0 (25.4072, 5.6134)
extrude "Extrusion37" add sketch "Sketch37" along normal blind 6.35
sketch "Sketch38" plane through (0, 0, 0.7366) normal (0, 0, 1) x (1, 0, 0)
  line L0 (76.1928, 422.1907) -> (-79.3822, 422.1907) projected
  line L1 (76.1928, 107.8911) -> (76.1928, -104.8085) projected
  circle A0 centre (65.8804, 302.3281) radius 1.9812 projected
  circle A1 centre (-15.0948, 302.3281) radius 1.9812 projected
  line L2 (-15.0948, 422.1907) -> (-15.0948, 405.5283)
  line L3 (-15.0948, 405.5283) -> (65.8804, 405.5283)
  line L4 (65.8804, 302.3281) -> (65.8804, 324.5531)
  line L5 (-15.0948, 302.3281) -> (-15.0948, 324.5531)
  circle A2 centre (-15.0948, 324.5531) radius 1.9812
  circle A3 centre (-15.0948, 405.5283) radius 1.9812
  circle A4 centre (65.8804, 405.5283) radius 1.9812
  circle A5 centre (65.8804, 324.5531) radius 1.9812
  point P0 (0, 0)
  dimension "d94" = 16.6624
  dimension "d95" = 22.225
extrude "Extrusion38" cut sketch "Sketch38" against normal blind 12.7 contours A3 L3 L2 | L2 L3 A3 | A2 | A4 | A5
sketch "Sketch39" plane through (0, 0, 0.7366) normal (0, 0, 1) x (1, 0, 0)
  circle A0 centre (65.8804, 383.3033) radius 1.9812 projected
  circle A1 centre (65.8804, 302.3281) radius 1.9812 projected
  circle A2 centre (-15.0948, 302.3281) radius 1.9812 projected
  circle A3 centre (-15.0948, 383.3033) radius 1.9812 projected
  point P0 (0, 0)
extrude "Extrusion39" add sketch "Sketch39" against normal blind 12.7
sketch "Sketch40" plane through (0, 0, 0.7366) normal (0, 0, 1) x (1, 0, 0)
  circle A0 centre (-15.0948, 15.0541) radius 1.9812 projected
  circle A1 centre (-15.0948, -65.9211) radius 1.9812 projected
  line L0 (76.1928, 107.8911) -> (76.1928, -104.8085) projected
  line L1 (-15.0948, -65.9211) -> (-15.0948, -88.1461)
  line L2 (-15.0948, -88.1461) -> (65.8804, -88.1461)
  line L3 (-15.0948, 15.0541) -> (-15.0948, -7.1709)
  line L4 (-15.0948, -7.1709) -> (65.8804, -7.1709)
  circle A2 centre (-15.0948, -88.1461) radius 1.9812
  circle A3 centre (65.8804, -88.1461) radius 1.9818
  circle A4 centre (65.8804, -7.1709) radius 1.9818
  circle A5 centre (-15.0948, -7.1709) radius 1.9812
  point P0 (0, 0)
  dimension "d100" = 22.225
  dimension "d101" = 22.225
extrude "Extrusion40" cut sketch "Sketch40" against normal blind 12.7 contours A2 L2 L1 | L1 L2 A2 | A5 L4 L3 | L3 L4 A5 | A3 | A4
sketch "Sketch41" plane through (0, 0, 0.7366) normal (0, 0, 1) x (1, 0, 0)
  circle A0 centre (65.8804, -65.9211) radius 1.9832 projected
  circle A1 centre (65.8804, 15.0541) radius 1.9818 projected
  circle A2 centre (-15.0948, 15.0541) radius 1.9812 projected
  circle A3 centre (-15.0948, -65.9211) radius 1.9812 projected
  point P0 (0, 0)
extrude "Extrusion41" add sketch "Sketch41" against normal blind 12.7
properties part number "holder"
